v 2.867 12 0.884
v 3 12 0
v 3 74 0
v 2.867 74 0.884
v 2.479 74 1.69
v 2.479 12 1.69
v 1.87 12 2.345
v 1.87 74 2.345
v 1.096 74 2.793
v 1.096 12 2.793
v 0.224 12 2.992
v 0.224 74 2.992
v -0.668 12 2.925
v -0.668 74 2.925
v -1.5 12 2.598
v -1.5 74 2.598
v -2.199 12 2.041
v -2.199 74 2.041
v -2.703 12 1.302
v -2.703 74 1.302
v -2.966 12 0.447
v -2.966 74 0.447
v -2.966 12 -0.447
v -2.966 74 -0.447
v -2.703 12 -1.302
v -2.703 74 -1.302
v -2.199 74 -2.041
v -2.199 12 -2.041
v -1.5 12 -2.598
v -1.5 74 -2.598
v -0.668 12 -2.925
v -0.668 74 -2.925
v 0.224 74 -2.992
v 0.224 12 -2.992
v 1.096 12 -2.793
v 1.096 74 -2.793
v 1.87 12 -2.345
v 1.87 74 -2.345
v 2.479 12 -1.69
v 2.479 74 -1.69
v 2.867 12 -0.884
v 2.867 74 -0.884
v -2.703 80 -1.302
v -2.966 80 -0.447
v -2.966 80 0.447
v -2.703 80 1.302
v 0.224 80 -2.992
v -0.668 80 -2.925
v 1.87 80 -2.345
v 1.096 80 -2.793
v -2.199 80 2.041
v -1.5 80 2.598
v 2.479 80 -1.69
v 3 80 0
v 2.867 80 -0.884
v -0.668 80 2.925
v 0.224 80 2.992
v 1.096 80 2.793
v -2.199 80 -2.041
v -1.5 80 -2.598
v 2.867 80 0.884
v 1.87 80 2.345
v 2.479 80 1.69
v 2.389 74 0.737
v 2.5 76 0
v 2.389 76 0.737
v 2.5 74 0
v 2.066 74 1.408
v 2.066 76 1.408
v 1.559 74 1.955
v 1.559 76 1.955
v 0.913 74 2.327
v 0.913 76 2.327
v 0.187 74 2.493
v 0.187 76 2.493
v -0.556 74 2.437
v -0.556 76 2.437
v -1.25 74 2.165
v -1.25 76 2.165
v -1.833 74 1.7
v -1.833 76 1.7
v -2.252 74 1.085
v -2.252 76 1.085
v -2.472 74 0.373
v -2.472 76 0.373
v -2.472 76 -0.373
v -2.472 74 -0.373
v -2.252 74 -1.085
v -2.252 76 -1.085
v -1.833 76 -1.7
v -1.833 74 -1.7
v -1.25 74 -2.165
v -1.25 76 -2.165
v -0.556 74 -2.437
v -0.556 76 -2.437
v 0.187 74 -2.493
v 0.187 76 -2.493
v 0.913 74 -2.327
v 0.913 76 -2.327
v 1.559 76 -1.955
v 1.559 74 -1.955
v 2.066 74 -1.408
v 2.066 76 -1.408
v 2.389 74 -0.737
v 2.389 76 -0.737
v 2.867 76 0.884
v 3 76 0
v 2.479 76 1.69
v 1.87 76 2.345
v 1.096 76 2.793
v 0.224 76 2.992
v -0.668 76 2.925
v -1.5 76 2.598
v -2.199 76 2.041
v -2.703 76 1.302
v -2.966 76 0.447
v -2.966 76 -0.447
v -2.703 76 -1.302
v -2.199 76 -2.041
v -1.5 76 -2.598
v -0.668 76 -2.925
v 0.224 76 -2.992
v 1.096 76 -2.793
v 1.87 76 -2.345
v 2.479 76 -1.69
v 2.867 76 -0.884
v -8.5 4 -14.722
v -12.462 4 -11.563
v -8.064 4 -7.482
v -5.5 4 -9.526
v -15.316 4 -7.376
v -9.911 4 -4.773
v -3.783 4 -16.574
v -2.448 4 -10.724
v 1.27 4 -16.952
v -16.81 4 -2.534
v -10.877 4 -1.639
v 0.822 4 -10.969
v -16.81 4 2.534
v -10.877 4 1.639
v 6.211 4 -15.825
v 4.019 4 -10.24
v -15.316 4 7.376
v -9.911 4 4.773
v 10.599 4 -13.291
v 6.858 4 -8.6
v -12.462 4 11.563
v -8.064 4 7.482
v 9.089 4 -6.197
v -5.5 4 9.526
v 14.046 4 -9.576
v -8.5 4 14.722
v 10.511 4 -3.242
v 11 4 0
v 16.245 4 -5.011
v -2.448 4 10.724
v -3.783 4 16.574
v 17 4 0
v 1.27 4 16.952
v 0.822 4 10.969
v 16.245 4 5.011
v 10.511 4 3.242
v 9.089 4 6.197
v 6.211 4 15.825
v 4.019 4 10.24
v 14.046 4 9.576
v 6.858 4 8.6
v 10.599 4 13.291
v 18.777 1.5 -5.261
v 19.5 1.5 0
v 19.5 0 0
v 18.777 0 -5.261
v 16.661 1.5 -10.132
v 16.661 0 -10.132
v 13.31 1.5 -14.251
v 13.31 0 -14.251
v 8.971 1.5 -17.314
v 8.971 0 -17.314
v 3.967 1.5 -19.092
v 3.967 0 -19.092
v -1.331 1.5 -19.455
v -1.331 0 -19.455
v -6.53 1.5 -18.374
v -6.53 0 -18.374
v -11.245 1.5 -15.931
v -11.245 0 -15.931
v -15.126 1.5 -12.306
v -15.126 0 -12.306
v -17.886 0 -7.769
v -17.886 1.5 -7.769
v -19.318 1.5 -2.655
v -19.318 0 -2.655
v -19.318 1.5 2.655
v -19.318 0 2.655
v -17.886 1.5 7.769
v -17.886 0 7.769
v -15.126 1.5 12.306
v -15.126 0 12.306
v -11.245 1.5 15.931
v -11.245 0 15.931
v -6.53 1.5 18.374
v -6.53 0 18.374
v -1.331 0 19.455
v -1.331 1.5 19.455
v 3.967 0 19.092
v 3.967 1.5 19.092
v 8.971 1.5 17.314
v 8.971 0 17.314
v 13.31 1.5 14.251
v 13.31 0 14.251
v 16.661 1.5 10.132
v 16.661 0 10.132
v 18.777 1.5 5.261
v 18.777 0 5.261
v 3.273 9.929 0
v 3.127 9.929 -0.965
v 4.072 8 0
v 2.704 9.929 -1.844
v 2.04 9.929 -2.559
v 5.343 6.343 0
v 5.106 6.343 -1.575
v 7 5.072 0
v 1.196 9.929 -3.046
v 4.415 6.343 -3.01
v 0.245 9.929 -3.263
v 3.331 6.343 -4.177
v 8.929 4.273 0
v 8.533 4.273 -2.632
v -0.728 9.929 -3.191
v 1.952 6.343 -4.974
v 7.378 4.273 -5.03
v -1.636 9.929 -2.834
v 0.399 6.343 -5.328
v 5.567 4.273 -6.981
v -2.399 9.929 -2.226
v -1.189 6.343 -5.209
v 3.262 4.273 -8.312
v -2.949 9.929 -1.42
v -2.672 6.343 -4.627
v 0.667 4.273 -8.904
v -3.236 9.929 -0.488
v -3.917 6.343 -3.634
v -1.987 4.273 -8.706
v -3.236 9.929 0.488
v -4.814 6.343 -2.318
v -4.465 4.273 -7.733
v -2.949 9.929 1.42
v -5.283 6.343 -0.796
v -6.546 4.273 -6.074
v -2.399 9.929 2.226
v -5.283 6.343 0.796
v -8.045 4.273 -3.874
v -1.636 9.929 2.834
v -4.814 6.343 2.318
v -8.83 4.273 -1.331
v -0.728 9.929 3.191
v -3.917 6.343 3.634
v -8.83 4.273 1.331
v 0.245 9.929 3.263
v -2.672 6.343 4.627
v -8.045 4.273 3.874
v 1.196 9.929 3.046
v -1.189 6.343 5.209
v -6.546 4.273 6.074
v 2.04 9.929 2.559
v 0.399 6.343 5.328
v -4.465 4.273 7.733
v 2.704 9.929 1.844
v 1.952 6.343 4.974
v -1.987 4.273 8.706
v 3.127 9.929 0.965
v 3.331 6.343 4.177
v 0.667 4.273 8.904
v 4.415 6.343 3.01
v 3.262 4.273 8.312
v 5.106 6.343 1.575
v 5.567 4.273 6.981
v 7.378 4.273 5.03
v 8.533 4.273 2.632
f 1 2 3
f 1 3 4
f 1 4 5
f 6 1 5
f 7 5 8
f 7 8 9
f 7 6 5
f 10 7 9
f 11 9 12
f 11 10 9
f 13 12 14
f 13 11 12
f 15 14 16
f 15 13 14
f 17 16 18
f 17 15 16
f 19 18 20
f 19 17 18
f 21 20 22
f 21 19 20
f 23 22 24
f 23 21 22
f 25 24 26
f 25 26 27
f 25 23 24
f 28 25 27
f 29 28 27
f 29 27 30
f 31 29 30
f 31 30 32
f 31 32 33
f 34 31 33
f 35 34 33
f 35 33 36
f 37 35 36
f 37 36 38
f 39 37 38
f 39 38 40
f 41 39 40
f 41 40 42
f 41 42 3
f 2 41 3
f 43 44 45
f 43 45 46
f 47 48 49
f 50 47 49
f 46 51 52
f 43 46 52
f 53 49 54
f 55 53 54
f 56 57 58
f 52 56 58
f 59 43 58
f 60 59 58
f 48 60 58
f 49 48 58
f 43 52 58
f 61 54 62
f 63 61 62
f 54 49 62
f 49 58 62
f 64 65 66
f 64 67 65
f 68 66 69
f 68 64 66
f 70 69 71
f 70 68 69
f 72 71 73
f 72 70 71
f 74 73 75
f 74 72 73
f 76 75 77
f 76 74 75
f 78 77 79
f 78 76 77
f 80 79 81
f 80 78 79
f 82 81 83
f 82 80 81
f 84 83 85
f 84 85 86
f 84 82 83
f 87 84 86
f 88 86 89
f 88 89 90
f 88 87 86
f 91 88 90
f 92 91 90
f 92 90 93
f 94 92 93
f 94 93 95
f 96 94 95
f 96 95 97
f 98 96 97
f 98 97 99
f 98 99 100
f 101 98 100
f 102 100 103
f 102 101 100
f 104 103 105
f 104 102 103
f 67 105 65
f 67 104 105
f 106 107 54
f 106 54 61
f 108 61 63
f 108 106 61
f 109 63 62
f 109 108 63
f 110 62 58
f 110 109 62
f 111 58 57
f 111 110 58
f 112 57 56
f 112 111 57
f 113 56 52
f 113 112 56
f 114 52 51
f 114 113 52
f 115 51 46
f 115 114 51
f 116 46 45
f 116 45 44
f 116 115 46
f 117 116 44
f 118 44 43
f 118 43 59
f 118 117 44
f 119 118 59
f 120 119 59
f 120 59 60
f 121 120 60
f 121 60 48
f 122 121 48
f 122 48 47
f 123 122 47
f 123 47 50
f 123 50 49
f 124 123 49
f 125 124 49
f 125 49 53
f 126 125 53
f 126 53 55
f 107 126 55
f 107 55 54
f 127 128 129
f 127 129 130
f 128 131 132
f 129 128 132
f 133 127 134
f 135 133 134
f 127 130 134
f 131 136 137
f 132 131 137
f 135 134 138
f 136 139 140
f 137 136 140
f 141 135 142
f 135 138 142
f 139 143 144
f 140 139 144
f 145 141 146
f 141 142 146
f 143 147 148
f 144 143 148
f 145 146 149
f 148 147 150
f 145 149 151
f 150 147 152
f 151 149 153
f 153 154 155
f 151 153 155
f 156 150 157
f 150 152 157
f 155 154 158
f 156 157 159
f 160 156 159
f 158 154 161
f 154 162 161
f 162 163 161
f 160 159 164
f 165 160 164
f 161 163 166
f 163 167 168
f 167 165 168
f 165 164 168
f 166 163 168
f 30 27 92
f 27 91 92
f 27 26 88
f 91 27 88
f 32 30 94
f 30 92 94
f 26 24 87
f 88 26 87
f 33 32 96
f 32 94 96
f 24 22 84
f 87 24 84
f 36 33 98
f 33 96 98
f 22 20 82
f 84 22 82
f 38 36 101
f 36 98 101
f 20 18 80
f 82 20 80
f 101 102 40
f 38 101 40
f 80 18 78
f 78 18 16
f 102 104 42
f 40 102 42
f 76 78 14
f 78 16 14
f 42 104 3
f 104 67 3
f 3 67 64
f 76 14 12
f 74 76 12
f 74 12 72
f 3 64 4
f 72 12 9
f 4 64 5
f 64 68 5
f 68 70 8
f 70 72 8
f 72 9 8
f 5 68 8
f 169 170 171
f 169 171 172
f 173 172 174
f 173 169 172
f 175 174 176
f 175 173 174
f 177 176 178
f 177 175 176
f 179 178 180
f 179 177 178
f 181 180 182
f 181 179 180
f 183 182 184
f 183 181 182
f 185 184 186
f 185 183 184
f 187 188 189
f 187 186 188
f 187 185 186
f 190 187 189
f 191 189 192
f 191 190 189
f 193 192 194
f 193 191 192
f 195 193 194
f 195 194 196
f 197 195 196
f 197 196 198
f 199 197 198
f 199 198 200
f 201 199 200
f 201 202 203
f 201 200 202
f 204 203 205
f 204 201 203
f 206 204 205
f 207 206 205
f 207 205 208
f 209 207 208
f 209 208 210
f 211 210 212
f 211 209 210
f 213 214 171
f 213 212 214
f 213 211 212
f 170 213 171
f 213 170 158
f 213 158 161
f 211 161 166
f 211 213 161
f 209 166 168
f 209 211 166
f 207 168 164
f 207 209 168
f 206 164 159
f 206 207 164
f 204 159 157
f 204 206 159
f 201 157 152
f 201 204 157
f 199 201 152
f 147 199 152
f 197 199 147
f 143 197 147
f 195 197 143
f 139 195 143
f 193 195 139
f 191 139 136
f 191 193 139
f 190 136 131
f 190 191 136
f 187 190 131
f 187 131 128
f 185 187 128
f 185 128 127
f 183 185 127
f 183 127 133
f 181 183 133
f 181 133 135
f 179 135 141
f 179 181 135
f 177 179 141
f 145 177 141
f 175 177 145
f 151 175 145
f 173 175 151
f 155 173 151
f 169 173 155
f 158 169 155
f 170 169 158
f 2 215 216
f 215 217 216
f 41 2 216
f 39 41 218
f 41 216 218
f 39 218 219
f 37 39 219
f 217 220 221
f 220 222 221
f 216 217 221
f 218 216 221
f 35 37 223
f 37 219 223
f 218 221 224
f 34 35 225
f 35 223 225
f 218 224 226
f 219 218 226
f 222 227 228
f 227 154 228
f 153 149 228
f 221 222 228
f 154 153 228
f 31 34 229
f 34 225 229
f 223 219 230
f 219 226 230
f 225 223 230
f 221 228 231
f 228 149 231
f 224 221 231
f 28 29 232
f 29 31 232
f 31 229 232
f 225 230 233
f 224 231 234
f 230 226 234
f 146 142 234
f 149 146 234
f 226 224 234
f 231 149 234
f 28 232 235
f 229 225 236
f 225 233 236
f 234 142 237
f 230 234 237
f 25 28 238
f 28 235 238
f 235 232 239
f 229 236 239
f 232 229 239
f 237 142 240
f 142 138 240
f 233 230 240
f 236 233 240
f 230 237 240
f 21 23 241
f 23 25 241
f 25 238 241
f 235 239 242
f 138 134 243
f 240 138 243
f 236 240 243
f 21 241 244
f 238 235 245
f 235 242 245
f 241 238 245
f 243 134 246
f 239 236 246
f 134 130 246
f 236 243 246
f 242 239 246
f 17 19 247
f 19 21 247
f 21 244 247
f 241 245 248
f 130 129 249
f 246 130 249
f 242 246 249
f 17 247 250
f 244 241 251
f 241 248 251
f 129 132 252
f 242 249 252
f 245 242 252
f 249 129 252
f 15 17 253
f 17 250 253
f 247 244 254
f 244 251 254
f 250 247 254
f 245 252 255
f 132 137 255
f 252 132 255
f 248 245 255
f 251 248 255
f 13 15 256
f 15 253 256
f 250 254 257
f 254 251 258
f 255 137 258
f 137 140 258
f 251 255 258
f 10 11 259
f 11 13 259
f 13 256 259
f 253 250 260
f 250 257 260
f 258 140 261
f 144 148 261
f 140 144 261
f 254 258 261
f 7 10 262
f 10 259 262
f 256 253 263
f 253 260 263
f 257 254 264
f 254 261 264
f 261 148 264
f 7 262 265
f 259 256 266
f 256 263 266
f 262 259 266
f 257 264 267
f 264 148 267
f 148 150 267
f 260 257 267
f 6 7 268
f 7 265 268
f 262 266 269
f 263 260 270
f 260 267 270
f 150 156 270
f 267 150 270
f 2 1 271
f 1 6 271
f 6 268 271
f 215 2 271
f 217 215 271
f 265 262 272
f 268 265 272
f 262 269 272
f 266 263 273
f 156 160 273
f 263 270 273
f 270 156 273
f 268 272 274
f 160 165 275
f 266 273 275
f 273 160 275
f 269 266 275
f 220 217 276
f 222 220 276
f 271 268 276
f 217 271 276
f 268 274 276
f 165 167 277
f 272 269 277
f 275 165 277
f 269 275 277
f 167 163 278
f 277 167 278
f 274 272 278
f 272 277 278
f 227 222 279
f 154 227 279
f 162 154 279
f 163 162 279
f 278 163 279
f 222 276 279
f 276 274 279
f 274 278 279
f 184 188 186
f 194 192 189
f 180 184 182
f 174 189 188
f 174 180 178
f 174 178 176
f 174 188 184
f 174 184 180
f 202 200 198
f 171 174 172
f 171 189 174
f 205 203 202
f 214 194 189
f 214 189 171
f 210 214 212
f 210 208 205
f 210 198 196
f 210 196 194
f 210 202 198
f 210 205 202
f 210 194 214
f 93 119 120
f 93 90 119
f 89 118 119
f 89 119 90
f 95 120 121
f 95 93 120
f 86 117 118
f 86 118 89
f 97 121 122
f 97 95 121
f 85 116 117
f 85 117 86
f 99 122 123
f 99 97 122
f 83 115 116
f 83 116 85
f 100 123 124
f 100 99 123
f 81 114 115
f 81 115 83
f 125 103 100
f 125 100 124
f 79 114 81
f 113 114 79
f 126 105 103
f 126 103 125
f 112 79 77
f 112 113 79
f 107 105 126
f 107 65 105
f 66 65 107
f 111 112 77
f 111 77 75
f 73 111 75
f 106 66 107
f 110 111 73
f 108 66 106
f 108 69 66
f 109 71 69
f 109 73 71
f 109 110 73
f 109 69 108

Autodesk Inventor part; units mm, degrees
ref_plane "YZ Plane" through (0, 0, 0) normal (1, 0, 0) x (0, 1, 0)
ref_plane "XZ Plane" through (0, 0, 0) normal (0, 1, 0) x (-1, 0, 0)
ref_plane "XY Plane" through (0, 0, 0) normal (0, 0, 1) x (1, 0, 0)
sketch "Эскиз1" plane through (0, 0, 0) normal (0, 0, 1) x (1, 0, 0)
  line L0 (0, 0) -> (19.5, 0)
  line L1 (19.5, 0) -> (19.5, 1.5)
  line L2 (19.5, 1.5) -> (17, 4)
  line L3 (0, 80) -> (3, 80)
  line L4 (17, 4) -> (11, 4)
  arc A0 (3, 12) -> (11, 4) centre (11, 12) ccw
  line L5 (3, 80) -> (3, 76)
  line L6 (3, 76) -> (2.5, 76)
  line L7 (2.5, 76) -> (2.5, 74)
  line L8 (2.5, 74) -> (3, 74)
  line L9 (3, 80) -> (3, 76)
  line L10 (3, 74) -> (3, 12)
  line L11 (0, 80) -> (0, 0)
  dimension "d0" = 19.5
  dimension "d1" = 1.5
  dimension "d2" = 45
  dimension "d3" = 17
  dimension "d4" = 3
  dimension "d5" = 8
  dimension "d6" = 80
  dimension "d7" = 4
  dimension "d8" = 2
  dimension "d9" = 0.5
revolve "Вращение1" add sketch "Эскиз1" angle 360 about axis through (0, 80, 0) along (0, -1, 0)
properties part number "выпускной_клапан"
